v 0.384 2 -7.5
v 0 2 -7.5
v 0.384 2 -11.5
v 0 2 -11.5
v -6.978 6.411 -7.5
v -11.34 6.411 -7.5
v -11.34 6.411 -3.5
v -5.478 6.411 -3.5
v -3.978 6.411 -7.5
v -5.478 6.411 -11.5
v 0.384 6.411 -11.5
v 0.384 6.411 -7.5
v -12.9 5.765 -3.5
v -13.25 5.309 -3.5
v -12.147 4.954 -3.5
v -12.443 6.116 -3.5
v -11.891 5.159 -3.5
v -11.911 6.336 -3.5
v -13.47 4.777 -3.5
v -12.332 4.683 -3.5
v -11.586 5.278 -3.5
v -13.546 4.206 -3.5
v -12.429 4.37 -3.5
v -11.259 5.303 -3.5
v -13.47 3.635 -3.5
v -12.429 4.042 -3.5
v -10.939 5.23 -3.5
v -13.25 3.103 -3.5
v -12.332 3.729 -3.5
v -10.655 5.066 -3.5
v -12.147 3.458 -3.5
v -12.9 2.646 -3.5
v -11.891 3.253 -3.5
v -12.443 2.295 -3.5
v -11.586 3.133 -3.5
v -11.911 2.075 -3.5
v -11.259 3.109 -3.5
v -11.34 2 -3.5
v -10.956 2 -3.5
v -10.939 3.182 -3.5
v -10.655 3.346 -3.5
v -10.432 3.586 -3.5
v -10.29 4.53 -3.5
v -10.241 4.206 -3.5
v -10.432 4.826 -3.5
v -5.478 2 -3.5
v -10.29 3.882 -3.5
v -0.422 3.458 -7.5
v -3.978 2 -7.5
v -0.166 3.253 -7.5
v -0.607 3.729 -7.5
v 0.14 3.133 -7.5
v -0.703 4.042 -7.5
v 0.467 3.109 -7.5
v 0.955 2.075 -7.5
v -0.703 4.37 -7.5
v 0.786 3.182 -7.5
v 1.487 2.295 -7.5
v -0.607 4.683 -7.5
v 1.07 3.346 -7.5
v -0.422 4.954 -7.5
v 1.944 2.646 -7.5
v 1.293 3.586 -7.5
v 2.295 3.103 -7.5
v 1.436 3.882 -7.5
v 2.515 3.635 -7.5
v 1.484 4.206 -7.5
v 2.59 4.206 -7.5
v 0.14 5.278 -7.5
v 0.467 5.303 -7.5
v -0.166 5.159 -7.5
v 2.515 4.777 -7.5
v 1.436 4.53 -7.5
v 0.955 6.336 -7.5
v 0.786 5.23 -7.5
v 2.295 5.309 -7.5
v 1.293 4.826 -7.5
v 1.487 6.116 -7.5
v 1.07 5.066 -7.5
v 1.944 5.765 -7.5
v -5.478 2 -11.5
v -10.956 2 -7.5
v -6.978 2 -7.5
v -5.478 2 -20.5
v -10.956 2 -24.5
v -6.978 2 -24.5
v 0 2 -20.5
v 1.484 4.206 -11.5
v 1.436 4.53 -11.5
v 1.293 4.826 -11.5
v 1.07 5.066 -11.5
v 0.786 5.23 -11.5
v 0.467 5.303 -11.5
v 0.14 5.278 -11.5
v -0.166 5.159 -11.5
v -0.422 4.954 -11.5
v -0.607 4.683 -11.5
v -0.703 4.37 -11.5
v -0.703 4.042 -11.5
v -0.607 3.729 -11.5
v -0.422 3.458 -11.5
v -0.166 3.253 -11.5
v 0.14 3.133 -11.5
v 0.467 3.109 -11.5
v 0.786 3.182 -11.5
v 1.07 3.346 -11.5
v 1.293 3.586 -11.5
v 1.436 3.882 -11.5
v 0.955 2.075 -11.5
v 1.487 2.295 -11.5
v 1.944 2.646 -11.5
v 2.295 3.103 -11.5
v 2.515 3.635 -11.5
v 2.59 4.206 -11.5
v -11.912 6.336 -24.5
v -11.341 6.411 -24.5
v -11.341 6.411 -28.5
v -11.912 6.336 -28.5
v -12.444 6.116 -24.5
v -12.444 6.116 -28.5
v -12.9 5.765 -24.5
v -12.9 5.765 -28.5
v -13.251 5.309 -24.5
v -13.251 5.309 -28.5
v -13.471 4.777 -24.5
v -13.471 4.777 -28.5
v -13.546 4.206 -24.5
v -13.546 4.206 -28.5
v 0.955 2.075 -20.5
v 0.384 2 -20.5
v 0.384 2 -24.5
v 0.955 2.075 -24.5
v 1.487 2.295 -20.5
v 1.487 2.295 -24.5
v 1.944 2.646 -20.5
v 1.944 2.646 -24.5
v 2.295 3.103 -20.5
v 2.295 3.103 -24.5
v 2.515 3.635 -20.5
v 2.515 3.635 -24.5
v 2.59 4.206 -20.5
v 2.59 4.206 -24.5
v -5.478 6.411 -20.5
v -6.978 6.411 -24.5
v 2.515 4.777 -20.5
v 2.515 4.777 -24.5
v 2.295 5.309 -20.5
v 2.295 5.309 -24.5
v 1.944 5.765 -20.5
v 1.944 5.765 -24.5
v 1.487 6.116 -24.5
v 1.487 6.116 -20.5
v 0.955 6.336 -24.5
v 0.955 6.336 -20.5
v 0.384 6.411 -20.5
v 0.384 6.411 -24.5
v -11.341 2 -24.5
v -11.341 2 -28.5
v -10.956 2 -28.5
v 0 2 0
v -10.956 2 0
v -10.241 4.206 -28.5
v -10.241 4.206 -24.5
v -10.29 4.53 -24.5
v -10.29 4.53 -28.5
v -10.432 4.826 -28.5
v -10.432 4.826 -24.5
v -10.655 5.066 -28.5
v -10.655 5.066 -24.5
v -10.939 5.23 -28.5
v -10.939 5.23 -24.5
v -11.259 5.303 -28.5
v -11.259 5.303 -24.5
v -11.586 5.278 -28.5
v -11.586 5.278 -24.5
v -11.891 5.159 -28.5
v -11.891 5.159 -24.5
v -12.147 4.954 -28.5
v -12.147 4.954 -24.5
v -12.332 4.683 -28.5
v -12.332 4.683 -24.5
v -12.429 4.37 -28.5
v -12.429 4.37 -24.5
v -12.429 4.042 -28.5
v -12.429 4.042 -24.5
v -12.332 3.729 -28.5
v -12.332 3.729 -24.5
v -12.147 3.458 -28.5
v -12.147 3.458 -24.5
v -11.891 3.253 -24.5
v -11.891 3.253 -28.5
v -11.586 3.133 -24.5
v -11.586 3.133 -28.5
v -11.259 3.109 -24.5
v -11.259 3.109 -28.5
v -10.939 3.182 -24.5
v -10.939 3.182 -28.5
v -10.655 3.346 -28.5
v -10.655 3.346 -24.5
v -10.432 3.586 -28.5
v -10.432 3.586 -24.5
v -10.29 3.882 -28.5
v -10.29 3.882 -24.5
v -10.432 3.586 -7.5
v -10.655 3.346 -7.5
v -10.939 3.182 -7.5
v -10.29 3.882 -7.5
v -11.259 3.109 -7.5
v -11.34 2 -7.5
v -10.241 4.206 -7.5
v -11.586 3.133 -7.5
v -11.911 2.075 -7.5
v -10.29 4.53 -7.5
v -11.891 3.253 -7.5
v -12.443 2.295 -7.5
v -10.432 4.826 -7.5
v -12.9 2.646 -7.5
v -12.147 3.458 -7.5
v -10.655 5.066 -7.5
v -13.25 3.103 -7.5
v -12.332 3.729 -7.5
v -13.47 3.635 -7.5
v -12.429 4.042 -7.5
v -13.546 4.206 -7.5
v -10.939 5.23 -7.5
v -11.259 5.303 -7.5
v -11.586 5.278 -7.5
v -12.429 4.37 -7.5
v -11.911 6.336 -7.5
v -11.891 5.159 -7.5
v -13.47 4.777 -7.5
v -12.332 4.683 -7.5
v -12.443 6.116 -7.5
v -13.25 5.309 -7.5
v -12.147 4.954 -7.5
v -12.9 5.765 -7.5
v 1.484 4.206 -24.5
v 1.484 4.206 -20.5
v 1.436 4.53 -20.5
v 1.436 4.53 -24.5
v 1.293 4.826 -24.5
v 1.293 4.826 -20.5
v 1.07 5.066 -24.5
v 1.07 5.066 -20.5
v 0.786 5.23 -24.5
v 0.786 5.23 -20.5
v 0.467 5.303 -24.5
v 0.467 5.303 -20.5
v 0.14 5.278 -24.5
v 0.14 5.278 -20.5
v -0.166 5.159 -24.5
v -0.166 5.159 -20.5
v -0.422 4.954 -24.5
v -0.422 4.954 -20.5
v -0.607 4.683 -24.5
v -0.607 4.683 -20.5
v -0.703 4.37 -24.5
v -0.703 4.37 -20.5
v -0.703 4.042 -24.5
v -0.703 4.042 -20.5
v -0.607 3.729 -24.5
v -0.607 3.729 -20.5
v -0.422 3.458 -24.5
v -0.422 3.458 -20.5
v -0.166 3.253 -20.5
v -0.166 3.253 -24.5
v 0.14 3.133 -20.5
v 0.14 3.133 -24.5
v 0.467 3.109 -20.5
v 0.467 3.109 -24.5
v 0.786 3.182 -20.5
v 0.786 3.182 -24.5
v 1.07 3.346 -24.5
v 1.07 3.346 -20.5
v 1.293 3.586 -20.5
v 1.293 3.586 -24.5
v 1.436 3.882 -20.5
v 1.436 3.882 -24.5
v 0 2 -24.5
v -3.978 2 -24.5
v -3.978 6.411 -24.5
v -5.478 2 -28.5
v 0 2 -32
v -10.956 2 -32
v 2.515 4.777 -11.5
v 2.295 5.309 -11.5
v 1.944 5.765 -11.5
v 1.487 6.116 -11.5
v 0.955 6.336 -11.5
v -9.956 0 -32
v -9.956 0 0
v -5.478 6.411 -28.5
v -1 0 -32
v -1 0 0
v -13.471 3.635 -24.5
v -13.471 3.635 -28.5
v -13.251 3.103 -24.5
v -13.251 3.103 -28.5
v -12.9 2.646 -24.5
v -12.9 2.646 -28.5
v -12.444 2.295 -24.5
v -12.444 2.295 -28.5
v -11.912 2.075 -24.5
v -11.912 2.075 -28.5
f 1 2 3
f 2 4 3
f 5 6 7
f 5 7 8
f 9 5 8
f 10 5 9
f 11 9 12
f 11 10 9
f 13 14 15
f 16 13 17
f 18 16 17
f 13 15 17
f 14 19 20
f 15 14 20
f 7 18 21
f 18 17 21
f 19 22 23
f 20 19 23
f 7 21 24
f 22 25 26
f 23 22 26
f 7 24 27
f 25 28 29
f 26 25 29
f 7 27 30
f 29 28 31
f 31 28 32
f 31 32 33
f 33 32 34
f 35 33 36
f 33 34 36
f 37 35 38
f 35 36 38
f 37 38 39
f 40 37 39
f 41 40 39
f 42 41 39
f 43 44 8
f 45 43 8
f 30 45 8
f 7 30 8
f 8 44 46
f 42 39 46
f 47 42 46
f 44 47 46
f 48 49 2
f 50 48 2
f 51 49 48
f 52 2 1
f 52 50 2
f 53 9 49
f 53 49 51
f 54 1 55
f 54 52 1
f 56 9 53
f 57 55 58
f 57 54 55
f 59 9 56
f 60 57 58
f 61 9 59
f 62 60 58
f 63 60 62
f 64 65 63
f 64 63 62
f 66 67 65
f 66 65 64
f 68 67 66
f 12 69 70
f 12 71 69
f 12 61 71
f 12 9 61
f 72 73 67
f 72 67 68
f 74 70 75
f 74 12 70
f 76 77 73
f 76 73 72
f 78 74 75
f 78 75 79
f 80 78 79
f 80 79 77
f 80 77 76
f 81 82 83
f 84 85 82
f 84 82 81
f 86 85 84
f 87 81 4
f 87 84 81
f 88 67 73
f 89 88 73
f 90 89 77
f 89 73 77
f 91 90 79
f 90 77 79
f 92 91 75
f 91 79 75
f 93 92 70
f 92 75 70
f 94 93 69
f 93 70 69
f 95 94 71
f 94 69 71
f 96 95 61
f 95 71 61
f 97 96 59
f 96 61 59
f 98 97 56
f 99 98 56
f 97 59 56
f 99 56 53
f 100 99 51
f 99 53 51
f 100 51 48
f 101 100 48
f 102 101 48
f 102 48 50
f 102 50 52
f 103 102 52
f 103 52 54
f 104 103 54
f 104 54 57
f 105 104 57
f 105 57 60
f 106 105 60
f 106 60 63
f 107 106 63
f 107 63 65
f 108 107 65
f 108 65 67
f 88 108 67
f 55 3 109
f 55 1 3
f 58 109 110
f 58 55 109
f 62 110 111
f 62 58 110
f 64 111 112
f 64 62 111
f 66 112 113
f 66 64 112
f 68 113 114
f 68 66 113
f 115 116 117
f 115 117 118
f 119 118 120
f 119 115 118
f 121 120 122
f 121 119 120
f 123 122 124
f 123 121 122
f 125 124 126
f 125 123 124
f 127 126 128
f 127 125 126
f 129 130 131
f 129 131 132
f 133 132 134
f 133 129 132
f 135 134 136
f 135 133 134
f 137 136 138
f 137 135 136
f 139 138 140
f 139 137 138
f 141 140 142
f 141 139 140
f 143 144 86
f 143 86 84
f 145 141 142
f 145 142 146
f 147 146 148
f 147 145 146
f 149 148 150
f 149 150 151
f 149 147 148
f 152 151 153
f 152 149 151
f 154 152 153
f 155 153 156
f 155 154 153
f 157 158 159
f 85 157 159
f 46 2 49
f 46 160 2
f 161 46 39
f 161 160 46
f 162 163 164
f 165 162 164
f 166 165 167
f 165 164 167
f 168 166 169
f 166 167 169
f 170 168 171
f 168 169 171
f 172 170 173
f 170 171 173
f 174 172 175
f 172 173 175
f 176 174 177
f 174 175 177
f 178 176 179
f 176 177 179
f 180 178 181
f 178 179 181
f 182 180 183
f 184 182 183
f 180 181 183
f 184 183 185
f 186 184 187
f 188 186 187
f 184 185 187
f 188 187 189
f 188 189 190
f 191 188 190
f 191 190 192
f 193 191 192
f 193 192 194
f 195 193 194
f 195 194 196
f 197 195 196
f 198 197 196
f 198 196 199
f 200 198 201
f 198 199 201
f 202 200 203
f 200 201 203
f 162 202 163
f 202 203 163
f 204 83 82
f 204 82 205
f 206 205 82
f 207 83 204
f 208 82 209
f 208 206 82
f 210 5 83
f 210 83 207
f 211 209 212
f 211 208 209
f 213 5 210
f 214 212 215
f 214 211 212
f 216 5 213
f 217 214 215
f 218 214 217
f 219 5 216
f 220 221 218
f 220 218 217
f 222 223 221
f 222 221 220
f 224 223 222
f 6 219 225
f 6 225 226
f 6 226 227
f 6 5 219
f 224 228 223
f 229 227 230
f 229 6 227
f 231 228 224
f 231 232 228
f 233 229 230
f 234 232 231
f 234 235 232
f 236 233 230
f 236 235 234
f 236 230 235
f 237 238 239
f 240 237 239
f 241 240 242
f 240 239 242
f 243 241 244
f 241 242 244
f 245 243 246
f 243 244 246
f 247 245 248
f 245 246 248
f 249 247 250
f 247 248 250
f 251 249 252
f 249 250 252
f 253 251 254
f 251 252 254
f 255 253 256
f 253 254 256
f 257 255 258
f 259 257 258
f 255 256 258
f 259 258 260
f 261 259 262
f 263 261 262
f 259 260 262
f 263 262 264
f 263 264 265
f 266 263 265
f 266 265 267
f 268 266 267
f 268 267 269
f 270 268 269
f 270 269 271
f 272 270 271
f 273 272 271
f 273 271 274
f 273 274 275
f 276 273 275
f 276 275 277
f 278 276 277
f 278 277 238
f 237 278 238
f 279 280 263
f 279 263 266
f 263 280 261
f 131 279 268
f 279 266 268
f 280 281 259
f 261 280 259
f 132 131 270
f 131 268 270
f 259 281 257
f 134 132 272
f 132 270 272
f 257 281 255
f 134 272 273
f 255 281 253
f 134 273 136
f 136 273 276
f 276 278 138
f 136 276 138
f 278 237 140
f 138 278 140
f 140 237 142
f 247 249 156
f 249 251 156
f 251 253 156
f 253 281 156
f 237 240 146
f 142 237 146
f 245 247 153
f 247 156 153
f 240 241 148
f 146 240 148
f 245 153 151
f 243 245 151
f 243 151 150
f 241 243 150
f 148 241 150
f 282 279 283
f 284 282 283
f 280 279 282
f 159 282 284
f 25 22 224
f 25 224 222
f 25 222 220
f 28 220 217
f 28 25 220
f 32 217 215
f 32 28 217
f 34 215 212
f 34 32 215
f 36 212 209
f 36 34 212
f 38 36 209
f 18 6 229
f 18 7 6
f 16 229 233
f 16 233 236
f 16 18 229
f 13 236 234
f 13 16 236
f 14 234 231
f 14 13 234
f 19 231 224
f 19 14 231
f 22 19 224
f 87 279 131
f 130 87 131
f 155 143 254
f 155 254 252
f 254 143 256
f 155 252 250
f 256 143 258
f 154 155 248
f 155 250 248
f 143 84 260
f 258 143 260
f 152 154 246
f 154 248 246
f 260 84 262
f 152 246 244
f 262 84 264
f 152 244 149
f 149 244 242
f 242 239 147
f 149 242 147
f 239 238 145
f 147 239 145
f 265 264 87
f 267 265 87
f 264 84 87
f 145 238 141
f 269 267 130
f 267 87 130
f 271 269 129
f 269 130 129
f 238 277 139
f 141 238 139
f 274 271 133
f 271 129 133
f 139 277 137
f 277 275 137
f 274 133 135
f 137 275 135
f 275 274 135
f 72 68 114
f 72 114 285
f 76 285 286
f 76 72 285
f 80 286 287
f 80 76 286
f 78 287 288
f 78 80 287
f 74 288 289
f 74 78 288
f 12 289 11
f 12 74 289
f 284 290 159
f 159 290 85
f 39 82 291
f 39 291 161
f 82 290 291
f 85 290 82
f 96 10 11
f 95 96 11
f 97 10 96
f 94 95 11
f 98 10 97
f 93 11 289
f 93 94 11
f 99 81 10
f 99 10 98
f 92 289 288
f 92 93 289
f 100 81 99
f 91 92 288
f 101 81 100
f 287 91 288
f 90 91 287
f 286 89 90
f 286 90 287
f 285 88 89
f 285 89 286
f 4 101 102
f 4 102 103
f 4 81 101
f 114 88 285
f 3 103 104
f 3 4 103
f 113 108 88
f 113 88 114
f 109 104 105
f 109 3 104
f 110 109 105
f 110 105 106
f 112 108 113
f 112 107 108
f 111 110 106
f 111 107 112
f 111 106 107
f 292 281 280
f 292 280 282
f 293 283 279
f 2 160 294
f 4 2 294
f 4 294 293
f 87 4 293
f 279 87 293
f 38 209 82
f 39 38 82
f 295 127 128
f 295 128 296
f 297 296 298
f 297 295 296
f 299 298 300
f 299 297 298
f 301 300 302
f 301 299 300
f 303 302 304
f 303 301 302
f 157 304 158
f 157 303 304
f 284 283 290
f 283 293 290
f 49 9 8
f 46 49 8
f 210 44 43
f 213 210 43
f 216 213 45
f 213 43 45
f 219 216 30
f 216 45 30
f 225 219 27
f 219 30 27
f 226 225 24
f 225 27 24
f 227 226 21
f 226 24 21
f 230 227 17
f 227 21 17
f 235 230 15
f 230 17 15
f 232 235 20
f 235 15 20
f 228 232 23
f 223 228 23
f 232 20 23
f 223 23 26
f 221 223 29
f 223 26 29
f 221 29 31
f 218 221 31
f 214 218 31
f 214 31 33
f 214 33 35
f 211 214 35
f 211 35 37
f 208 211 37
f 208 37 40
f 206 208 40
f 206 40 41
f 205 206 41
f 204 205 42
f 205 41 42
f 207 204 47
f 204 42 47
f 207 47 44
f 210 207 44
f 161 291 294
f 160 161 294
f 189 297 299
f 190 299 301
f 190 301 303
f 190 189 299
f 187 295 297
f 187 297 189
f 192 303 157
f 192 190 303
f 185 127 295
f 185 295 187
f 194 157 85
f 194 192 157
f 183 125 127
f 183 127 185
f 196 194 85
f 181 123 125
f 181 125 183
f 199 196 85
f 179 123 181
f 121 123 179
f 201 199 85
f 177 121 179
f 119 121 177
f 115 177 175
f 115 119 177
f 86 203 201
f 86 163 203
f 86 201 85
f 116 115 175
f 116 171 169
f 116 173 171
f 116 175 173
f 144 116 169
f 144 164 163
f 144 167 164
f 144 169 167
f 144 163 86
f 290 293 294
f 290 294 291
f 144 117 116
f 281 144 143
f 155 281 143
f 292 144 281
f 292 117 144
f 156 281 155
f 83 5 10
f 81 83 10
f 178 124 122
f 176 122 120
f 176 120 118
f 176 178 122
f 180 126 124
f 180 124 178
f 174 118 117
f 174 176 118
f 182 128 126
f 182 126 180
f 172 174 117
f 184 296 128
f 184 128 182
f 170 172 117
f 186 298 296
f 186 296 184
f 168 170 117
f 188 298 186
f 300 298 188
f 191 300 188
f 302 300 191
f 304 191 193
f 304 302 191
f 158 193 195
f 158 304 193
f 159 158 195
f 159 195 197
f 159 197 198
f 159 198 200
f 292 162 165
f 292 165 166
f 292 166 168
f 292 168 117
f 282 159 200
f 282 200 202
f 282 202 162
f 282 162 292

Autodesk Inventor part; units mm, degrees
ref_plane "YZ Plane" through (0, 0, 0) normal (1, 0, 0) x (0, 1, 0)
ref_plane "XZ Plane" through (0, 0, 0) normal (0, 1, 0) x (-1, 0, 0)
ref_plane "XY Plane" through (0, 0, 0) normal (0, 0, 1) x (1, 0, 0)
sketch "Sketch1" plane through (0, 0, 0) normal (0, 1, 0) x (-1, 0, 0)
  line L0 (0, 0) -> (0, -32)
  line L1 (0, -32) -> (10.9556, -32)
  line L2 (10.9556, -32) -> (10.9556, 0)
  line L3 (10.9556, 0) -> (0, 0)
  dimension "d0" = 32
  dimension "d1" = 10.9556
extrude "Extrusion1" add sketch "Sketch1" along normal blind 2
sketch "Sketch2" plane through (-10.9556, 0, 0) normal (0, 0, 1) x (1, 0, 0)
  line L0 (10.9556, 0) -> (0, 0) projected
  line L1 (10.9556, 0) -> (9.9556, 0)
  line L2 (9.9556, 0) -> (9.9556, 2)
  line L3 (10.9556, 2) -> (0, 2) projected
  line L4 (10.9556, 2) -> (9.9556, 0)
  line L5 (0, 0) -> (0, 2) projected
  line L6 (0, 0) -> (1, 0)
  line L7 (1, 0) -> (0, 2)
  line L8 (1, 0) -> (0, 0)
  line L9 (0, 2) -> (0, 0)
  line L10 (0, 2) -> (10.9556, 2)
  line L11 (9.9556, 0) -> (1, 0)
  line L12 (9.9556, 0) -> (10.9556, 0)
  line L13 (10.9556, 0) -> (10.9556, 2) projected
  line L14 (10.9556, 2) -> (10.9556, 0)
  line L15 (10.9556, 0) -> (9.9556, 0)
  dimension "d4" = 1
  dimension "d5" = 1
extrude "Extrusion2" cut sketch "Sketch2" against normal through all contours L0 L4 L13 | L0 L5 L7
sketch "Sketch3" plane through (0, 2, 0) normal (0, 1, 0) x (1, 0, 0)
  line L0 (-10.9556, 32) -> (-10.9556, 0) projected
  line L1 (-10.9556, 32) -> (-10.9556, 0)
  line L2 (-10.9556, 0) -> (-10.9556, 16)
  line L3 (-10.9556, 16) -> (0, 16)
  line L4 (0, 0) -> (0, 32) projected
  line L5 (-10.9556, 0) -> (0, 0) projected
  line L6 (0, 32) -> (-10.9556, 32) projected
  line L7 (-10.9556, 32) -> (-10.9556, 30)
  line L8 (-10.9556, 28.5) -> (0, 28.5)
  line L9 (-10.9556, 0) -> (-10.9556, 2)
  line L10 (-10.9556, 3.5) -> (0, 3.5)
  line L11 (-10.9556, 30) -> (-10.9556, 22)
  line L12 (-10.9556, 20.5) -> (0, 20.5)
  line L13 (-10.9556, 2) -> (-10.9556, 10)
  line L14 (-10.9556, 11.5) -> (0, 11.5)
  line L15 (-10.9556, 20.5) -> (-11.494, 20.5)
  line L16 (-11.494, 20.5) -> (-11.494, 28.5)
  line L17 (-11.494, 28.5) -> (-10.9556, 28.5)
  line L18 (-11.494, 28.5) -> (-13.5464, 28.5)
  line L19 (-13.5464, 28.5) -> (-13.5464, 20.5)
  line L20 (-13.5464, 20.5) -> (-11.494, 20.5)
  line L21 (-11.494, 28.5) -> (-12.994, 28.5)
  line L22 (-11.494, 28.5) -> (-9.994, 28.5)
  line L23 (0, 30) -> (0, 22)
  line L24 (0, 20.5) -> (0.538, 20.5)
  line L25 (0.538, 20.5) -> (0.538, 28.5)
  line L26 (0.538, 28.5) -> (0, 28.5)
  line L27 (0.538, 28.5) -> (2.59, 28.5)
  line L28 (2.59, 28.5) -> (2.59, 20.5)
  line L29 (2.59, 20.5) -> (0.538, 20.5)
  line L30 (0.538, 28.5) -> (2.038, 28.5)
  line L31 (2.038, 28.5) -> (2.038, 20.5)
  line L32 (0.538, 28.5) -> (-0.962, 28.5)
  line L33 (-0.962, 30) -> (-0.962, 22)
  line L34 (-10.9556, 11.5) -> (-11.4936, 11.5)
  line L35 (-11.4936, 11.5) -> (-13.5456, 11.5)
  line L36 (-13.5456, 11.5) -> (-13.5456, 3.5)
  line L37 (-13.5456, 3.5) -> (-10.9556, 3.5)
  line L38 (0, 11.5) -> (0.538, 11.5)
  line L39 (0.538, 11.5) -> (2.59, 11.5)
  line L40 (2.59, 11.5) -> (2.59, 3.5)
  line L41 (2.59, 3.5) -> (0, 3.5)
  line L42 (0, 10) -> (0, 11.5)
  line L43 (0, 11.5) -> (-10.9556, 11.5)
  line L44 (0, 22) -> (0, 20.5)
  dimension "d8" = 32
  dimension "d10" = 2
  dimension "d11" = 2
  dimension "d12" = 8
  dimension "d13" = 8
  dimension "d14" = 0.5384
  dimension "d15" = 2.0524
  dimension "d16" = 1.5
  dimension "d17" = 1.5
  dimension "d23" = 0.538
  dimension "d24" = 2.052
  dimension "d25" = 1.5
  dimension "d26" = 1.5
  dimension "d27" = 0.538
  dimension "d28" = 2.052
  dimension "d29" = 0.538
  dimension "d43" = 1.5
  dimension "d44" = 1.5
extrude "Extrusion3" add sketch "Sketch3" along normal blind 4.4114 contours L8 L4 L12 L0 | L0 L15 L16 L17 | L16 L20 L19 L18 | L26 L25 L24 L4 | L27 L31 L29 L25 | L27 L28 L29 L31 | L14 L4 L10 L0 | L0 L37 L36 L35 L34 | L38 L39 L40 L41 L4
fillet "Fillet1" radius 2.2055 8 edges at (2.59, 6.4114, -7.5) (2.59, 2, -7.5) (2.59, 6.4114, -24.5) (2.59, 2, -24.5) (-13.5464, 6.4114, -24.5) (-13.5464, 2, -24.5) (-13.5456, 6.4114, -7.5) (-13.5456, 2, -7.5)
sketch "Sketch4" plane through (0, 6.4114, 0) normal (0, 1, 0) x (1, 0, 0)
  line L0 (-11.3401, 3.5) -> (-11.3401, 11.5) projected
  line L1 (-11.3401, 11.5) -> (-11.3401, 3.5)
  line L2 (-11.3401, 3.5) -> (-11.3401, 7.5)
  line L3 (-11.3401, 7.5) -> (-13.5456, 7.5)
  line L4 (-13.5456, 3.5) -> (-13.5456, 11.5) projected
  line L5 (-11.3401, 7.5) -> (2.59, 7.5)
  line L6 (2.59, 11.5) -> (2.59, 3.5) projected
  line L7 (0.3845, 3.5) -> (0.3845, 11.5) projected
  line L8 (-10.9556, 11.5) -> (0, 11.5) projected
  line L9 (-5.4778, 11.5) -> (-5.4778, 3.5)
  line L10 (-11.3401, 3.5) -> (0.3845, 3.5) projected
  line L11 (-5.4778, 7.5) -> (-6.9778, 7.5)
  line L12 (-6.9778, 7.5) -> (-5.4778, 11.5)
  line L13 (-5.4778, 7.5) -> (-3.9778, 7.5)
  line L14 (-3.9778, 7.5) -> (-5.4778, 3.5)
  line L15 (2.59, 2) -> (0.3845, 2) projected
  line L16 (-5.4778, 3.5) -> (2.59, 3.5)
  line L17 (2.59, 3.5) -> (2.59, 7.5)
  line L18 (-13.5456, 7.5) -> (-13.5456, 11.5)
  line L19 (-13.5456, 11.5) -> (-11.3401, 11.5) projected
  line L20 (-5.4778, 11.5) -> (-13.5456, 11.5)
  line L21 (-13.5456, 11.5) -> (-13.5456, 7.5)
  line L22 (-11.3409, 28.5) -> (-11.3409, 20.5) projected
  line L23 (-11.3409, 28.5) -> (-11.3409, 20.5)
  line L24 (-11.3409, 20.5) -> (-11.3409, 24.5)
  line L25 (-11.3409, 24.5) -> (0.3845, 24.5)
  line L26 (0.3845, 24.5) -> (-5.4782, 24.5)
  line L27 (-5.4782, 28.5) -> (-5.4782, 24.5)
  line L28 (-5.4782, 24.5) -> (-5.4782, 20.5)
  line L29 (-5.4782, 20.5) -> (-5.4782, 24.5)
  line L30 (-5.4782, 24.5) -> (-3.9782, 24.5)
  line L31 (-3.9782, 24.5) -> (-5.4782, 28.5)
  line L32 (-5.4782, 24.5) -> (-6.9782, 24.5)
  line L33 (-6.9782, 24.5) -> (-5.4782, 20.5)
  line L34 (-13.5464, 20.5) -> (-13.5464, 28.5) projected
  line L35 (-5.4782, 20.5) -> (-13.5464, 20.5)
  line L36 (-13.5464, 20.5) -> (-13.5464, 24.5)
  line L37 (-13.5464, 24.5) -> (-6.9782, 24.5)
  line L38 (-10.9556, 28.5) -> (0, 28.5) projected
  line L39 (-3.9782, 24.5) -> (4.3111, 24.5)
  line L40 (4.3111, 24.5) -> (4.3111, 28.5)
  line L41 (-5.4782, 28.5) -> (4.3111, 28.5)
  line L42 (0.3845, 28.5) -> (-11.3409, 28.5) projected
  point P0 (0, 0)
  point P1 (2.59, 10)
  point P2 (0.3845, 10)
  point P3 (0, 10)
  point P4 (0, 28.5)
  point P5 (-3.9782, 24.5)
  dimension "d33" = 1.5
  dimension "d34" = 1.5
  dimension "d37" = 1.5
  dimension "d38" = 1.5
extrude "Extrusion4" cut sketch "Sketch4" against normal blind 4.4114 contours L3 L4 L19 L0 | L0 L20 L8 L12 L5 | L14 L5 L7 L10 | L7 L5 L6 L16 | L25 L33 L35 L22 | L22 L35 L34 L37 | L38 L41 L40 L39 L25 L31
sketch "Sketch5" plane through (-3.9778, 6.4114, -7.5) normal (0, 0, 1) x (1, 0, 0)
  arc A0 (6.5678, -2.2055) -> (4.3623, 0) centre (4.3623, -2.2055) ccw projected
  line L0 (4.3623, 0) -> (4.3623, -2.2055)
  arc A1 (-7.3631, 0) -> (-9.5686, -2.2055) centre (-7.3631, -2.2055) ccw projected
  line L1 (-7.3631, 0) -> (-7.3631, -2.2055)
  circle A2 centre (-7.3631, -2.2055) radius 1.1
  circle A3 centre (4.3623, -2.2055) radius 1.1
  point P0 (3.9778, -6.4114)
  dimension "d39" = 2.2
  dimension "d40" = 2.2
extrude "Extrusion5" cut sketch "Sketch5" along normal through all both and the other way through all
sketch "Sketch6" plane through (0, 6.4114, 0) normal (0, 1, 0) x (1, 0, 0)
  point P0 (0, 0)
properties part number "pás-tiger I"
